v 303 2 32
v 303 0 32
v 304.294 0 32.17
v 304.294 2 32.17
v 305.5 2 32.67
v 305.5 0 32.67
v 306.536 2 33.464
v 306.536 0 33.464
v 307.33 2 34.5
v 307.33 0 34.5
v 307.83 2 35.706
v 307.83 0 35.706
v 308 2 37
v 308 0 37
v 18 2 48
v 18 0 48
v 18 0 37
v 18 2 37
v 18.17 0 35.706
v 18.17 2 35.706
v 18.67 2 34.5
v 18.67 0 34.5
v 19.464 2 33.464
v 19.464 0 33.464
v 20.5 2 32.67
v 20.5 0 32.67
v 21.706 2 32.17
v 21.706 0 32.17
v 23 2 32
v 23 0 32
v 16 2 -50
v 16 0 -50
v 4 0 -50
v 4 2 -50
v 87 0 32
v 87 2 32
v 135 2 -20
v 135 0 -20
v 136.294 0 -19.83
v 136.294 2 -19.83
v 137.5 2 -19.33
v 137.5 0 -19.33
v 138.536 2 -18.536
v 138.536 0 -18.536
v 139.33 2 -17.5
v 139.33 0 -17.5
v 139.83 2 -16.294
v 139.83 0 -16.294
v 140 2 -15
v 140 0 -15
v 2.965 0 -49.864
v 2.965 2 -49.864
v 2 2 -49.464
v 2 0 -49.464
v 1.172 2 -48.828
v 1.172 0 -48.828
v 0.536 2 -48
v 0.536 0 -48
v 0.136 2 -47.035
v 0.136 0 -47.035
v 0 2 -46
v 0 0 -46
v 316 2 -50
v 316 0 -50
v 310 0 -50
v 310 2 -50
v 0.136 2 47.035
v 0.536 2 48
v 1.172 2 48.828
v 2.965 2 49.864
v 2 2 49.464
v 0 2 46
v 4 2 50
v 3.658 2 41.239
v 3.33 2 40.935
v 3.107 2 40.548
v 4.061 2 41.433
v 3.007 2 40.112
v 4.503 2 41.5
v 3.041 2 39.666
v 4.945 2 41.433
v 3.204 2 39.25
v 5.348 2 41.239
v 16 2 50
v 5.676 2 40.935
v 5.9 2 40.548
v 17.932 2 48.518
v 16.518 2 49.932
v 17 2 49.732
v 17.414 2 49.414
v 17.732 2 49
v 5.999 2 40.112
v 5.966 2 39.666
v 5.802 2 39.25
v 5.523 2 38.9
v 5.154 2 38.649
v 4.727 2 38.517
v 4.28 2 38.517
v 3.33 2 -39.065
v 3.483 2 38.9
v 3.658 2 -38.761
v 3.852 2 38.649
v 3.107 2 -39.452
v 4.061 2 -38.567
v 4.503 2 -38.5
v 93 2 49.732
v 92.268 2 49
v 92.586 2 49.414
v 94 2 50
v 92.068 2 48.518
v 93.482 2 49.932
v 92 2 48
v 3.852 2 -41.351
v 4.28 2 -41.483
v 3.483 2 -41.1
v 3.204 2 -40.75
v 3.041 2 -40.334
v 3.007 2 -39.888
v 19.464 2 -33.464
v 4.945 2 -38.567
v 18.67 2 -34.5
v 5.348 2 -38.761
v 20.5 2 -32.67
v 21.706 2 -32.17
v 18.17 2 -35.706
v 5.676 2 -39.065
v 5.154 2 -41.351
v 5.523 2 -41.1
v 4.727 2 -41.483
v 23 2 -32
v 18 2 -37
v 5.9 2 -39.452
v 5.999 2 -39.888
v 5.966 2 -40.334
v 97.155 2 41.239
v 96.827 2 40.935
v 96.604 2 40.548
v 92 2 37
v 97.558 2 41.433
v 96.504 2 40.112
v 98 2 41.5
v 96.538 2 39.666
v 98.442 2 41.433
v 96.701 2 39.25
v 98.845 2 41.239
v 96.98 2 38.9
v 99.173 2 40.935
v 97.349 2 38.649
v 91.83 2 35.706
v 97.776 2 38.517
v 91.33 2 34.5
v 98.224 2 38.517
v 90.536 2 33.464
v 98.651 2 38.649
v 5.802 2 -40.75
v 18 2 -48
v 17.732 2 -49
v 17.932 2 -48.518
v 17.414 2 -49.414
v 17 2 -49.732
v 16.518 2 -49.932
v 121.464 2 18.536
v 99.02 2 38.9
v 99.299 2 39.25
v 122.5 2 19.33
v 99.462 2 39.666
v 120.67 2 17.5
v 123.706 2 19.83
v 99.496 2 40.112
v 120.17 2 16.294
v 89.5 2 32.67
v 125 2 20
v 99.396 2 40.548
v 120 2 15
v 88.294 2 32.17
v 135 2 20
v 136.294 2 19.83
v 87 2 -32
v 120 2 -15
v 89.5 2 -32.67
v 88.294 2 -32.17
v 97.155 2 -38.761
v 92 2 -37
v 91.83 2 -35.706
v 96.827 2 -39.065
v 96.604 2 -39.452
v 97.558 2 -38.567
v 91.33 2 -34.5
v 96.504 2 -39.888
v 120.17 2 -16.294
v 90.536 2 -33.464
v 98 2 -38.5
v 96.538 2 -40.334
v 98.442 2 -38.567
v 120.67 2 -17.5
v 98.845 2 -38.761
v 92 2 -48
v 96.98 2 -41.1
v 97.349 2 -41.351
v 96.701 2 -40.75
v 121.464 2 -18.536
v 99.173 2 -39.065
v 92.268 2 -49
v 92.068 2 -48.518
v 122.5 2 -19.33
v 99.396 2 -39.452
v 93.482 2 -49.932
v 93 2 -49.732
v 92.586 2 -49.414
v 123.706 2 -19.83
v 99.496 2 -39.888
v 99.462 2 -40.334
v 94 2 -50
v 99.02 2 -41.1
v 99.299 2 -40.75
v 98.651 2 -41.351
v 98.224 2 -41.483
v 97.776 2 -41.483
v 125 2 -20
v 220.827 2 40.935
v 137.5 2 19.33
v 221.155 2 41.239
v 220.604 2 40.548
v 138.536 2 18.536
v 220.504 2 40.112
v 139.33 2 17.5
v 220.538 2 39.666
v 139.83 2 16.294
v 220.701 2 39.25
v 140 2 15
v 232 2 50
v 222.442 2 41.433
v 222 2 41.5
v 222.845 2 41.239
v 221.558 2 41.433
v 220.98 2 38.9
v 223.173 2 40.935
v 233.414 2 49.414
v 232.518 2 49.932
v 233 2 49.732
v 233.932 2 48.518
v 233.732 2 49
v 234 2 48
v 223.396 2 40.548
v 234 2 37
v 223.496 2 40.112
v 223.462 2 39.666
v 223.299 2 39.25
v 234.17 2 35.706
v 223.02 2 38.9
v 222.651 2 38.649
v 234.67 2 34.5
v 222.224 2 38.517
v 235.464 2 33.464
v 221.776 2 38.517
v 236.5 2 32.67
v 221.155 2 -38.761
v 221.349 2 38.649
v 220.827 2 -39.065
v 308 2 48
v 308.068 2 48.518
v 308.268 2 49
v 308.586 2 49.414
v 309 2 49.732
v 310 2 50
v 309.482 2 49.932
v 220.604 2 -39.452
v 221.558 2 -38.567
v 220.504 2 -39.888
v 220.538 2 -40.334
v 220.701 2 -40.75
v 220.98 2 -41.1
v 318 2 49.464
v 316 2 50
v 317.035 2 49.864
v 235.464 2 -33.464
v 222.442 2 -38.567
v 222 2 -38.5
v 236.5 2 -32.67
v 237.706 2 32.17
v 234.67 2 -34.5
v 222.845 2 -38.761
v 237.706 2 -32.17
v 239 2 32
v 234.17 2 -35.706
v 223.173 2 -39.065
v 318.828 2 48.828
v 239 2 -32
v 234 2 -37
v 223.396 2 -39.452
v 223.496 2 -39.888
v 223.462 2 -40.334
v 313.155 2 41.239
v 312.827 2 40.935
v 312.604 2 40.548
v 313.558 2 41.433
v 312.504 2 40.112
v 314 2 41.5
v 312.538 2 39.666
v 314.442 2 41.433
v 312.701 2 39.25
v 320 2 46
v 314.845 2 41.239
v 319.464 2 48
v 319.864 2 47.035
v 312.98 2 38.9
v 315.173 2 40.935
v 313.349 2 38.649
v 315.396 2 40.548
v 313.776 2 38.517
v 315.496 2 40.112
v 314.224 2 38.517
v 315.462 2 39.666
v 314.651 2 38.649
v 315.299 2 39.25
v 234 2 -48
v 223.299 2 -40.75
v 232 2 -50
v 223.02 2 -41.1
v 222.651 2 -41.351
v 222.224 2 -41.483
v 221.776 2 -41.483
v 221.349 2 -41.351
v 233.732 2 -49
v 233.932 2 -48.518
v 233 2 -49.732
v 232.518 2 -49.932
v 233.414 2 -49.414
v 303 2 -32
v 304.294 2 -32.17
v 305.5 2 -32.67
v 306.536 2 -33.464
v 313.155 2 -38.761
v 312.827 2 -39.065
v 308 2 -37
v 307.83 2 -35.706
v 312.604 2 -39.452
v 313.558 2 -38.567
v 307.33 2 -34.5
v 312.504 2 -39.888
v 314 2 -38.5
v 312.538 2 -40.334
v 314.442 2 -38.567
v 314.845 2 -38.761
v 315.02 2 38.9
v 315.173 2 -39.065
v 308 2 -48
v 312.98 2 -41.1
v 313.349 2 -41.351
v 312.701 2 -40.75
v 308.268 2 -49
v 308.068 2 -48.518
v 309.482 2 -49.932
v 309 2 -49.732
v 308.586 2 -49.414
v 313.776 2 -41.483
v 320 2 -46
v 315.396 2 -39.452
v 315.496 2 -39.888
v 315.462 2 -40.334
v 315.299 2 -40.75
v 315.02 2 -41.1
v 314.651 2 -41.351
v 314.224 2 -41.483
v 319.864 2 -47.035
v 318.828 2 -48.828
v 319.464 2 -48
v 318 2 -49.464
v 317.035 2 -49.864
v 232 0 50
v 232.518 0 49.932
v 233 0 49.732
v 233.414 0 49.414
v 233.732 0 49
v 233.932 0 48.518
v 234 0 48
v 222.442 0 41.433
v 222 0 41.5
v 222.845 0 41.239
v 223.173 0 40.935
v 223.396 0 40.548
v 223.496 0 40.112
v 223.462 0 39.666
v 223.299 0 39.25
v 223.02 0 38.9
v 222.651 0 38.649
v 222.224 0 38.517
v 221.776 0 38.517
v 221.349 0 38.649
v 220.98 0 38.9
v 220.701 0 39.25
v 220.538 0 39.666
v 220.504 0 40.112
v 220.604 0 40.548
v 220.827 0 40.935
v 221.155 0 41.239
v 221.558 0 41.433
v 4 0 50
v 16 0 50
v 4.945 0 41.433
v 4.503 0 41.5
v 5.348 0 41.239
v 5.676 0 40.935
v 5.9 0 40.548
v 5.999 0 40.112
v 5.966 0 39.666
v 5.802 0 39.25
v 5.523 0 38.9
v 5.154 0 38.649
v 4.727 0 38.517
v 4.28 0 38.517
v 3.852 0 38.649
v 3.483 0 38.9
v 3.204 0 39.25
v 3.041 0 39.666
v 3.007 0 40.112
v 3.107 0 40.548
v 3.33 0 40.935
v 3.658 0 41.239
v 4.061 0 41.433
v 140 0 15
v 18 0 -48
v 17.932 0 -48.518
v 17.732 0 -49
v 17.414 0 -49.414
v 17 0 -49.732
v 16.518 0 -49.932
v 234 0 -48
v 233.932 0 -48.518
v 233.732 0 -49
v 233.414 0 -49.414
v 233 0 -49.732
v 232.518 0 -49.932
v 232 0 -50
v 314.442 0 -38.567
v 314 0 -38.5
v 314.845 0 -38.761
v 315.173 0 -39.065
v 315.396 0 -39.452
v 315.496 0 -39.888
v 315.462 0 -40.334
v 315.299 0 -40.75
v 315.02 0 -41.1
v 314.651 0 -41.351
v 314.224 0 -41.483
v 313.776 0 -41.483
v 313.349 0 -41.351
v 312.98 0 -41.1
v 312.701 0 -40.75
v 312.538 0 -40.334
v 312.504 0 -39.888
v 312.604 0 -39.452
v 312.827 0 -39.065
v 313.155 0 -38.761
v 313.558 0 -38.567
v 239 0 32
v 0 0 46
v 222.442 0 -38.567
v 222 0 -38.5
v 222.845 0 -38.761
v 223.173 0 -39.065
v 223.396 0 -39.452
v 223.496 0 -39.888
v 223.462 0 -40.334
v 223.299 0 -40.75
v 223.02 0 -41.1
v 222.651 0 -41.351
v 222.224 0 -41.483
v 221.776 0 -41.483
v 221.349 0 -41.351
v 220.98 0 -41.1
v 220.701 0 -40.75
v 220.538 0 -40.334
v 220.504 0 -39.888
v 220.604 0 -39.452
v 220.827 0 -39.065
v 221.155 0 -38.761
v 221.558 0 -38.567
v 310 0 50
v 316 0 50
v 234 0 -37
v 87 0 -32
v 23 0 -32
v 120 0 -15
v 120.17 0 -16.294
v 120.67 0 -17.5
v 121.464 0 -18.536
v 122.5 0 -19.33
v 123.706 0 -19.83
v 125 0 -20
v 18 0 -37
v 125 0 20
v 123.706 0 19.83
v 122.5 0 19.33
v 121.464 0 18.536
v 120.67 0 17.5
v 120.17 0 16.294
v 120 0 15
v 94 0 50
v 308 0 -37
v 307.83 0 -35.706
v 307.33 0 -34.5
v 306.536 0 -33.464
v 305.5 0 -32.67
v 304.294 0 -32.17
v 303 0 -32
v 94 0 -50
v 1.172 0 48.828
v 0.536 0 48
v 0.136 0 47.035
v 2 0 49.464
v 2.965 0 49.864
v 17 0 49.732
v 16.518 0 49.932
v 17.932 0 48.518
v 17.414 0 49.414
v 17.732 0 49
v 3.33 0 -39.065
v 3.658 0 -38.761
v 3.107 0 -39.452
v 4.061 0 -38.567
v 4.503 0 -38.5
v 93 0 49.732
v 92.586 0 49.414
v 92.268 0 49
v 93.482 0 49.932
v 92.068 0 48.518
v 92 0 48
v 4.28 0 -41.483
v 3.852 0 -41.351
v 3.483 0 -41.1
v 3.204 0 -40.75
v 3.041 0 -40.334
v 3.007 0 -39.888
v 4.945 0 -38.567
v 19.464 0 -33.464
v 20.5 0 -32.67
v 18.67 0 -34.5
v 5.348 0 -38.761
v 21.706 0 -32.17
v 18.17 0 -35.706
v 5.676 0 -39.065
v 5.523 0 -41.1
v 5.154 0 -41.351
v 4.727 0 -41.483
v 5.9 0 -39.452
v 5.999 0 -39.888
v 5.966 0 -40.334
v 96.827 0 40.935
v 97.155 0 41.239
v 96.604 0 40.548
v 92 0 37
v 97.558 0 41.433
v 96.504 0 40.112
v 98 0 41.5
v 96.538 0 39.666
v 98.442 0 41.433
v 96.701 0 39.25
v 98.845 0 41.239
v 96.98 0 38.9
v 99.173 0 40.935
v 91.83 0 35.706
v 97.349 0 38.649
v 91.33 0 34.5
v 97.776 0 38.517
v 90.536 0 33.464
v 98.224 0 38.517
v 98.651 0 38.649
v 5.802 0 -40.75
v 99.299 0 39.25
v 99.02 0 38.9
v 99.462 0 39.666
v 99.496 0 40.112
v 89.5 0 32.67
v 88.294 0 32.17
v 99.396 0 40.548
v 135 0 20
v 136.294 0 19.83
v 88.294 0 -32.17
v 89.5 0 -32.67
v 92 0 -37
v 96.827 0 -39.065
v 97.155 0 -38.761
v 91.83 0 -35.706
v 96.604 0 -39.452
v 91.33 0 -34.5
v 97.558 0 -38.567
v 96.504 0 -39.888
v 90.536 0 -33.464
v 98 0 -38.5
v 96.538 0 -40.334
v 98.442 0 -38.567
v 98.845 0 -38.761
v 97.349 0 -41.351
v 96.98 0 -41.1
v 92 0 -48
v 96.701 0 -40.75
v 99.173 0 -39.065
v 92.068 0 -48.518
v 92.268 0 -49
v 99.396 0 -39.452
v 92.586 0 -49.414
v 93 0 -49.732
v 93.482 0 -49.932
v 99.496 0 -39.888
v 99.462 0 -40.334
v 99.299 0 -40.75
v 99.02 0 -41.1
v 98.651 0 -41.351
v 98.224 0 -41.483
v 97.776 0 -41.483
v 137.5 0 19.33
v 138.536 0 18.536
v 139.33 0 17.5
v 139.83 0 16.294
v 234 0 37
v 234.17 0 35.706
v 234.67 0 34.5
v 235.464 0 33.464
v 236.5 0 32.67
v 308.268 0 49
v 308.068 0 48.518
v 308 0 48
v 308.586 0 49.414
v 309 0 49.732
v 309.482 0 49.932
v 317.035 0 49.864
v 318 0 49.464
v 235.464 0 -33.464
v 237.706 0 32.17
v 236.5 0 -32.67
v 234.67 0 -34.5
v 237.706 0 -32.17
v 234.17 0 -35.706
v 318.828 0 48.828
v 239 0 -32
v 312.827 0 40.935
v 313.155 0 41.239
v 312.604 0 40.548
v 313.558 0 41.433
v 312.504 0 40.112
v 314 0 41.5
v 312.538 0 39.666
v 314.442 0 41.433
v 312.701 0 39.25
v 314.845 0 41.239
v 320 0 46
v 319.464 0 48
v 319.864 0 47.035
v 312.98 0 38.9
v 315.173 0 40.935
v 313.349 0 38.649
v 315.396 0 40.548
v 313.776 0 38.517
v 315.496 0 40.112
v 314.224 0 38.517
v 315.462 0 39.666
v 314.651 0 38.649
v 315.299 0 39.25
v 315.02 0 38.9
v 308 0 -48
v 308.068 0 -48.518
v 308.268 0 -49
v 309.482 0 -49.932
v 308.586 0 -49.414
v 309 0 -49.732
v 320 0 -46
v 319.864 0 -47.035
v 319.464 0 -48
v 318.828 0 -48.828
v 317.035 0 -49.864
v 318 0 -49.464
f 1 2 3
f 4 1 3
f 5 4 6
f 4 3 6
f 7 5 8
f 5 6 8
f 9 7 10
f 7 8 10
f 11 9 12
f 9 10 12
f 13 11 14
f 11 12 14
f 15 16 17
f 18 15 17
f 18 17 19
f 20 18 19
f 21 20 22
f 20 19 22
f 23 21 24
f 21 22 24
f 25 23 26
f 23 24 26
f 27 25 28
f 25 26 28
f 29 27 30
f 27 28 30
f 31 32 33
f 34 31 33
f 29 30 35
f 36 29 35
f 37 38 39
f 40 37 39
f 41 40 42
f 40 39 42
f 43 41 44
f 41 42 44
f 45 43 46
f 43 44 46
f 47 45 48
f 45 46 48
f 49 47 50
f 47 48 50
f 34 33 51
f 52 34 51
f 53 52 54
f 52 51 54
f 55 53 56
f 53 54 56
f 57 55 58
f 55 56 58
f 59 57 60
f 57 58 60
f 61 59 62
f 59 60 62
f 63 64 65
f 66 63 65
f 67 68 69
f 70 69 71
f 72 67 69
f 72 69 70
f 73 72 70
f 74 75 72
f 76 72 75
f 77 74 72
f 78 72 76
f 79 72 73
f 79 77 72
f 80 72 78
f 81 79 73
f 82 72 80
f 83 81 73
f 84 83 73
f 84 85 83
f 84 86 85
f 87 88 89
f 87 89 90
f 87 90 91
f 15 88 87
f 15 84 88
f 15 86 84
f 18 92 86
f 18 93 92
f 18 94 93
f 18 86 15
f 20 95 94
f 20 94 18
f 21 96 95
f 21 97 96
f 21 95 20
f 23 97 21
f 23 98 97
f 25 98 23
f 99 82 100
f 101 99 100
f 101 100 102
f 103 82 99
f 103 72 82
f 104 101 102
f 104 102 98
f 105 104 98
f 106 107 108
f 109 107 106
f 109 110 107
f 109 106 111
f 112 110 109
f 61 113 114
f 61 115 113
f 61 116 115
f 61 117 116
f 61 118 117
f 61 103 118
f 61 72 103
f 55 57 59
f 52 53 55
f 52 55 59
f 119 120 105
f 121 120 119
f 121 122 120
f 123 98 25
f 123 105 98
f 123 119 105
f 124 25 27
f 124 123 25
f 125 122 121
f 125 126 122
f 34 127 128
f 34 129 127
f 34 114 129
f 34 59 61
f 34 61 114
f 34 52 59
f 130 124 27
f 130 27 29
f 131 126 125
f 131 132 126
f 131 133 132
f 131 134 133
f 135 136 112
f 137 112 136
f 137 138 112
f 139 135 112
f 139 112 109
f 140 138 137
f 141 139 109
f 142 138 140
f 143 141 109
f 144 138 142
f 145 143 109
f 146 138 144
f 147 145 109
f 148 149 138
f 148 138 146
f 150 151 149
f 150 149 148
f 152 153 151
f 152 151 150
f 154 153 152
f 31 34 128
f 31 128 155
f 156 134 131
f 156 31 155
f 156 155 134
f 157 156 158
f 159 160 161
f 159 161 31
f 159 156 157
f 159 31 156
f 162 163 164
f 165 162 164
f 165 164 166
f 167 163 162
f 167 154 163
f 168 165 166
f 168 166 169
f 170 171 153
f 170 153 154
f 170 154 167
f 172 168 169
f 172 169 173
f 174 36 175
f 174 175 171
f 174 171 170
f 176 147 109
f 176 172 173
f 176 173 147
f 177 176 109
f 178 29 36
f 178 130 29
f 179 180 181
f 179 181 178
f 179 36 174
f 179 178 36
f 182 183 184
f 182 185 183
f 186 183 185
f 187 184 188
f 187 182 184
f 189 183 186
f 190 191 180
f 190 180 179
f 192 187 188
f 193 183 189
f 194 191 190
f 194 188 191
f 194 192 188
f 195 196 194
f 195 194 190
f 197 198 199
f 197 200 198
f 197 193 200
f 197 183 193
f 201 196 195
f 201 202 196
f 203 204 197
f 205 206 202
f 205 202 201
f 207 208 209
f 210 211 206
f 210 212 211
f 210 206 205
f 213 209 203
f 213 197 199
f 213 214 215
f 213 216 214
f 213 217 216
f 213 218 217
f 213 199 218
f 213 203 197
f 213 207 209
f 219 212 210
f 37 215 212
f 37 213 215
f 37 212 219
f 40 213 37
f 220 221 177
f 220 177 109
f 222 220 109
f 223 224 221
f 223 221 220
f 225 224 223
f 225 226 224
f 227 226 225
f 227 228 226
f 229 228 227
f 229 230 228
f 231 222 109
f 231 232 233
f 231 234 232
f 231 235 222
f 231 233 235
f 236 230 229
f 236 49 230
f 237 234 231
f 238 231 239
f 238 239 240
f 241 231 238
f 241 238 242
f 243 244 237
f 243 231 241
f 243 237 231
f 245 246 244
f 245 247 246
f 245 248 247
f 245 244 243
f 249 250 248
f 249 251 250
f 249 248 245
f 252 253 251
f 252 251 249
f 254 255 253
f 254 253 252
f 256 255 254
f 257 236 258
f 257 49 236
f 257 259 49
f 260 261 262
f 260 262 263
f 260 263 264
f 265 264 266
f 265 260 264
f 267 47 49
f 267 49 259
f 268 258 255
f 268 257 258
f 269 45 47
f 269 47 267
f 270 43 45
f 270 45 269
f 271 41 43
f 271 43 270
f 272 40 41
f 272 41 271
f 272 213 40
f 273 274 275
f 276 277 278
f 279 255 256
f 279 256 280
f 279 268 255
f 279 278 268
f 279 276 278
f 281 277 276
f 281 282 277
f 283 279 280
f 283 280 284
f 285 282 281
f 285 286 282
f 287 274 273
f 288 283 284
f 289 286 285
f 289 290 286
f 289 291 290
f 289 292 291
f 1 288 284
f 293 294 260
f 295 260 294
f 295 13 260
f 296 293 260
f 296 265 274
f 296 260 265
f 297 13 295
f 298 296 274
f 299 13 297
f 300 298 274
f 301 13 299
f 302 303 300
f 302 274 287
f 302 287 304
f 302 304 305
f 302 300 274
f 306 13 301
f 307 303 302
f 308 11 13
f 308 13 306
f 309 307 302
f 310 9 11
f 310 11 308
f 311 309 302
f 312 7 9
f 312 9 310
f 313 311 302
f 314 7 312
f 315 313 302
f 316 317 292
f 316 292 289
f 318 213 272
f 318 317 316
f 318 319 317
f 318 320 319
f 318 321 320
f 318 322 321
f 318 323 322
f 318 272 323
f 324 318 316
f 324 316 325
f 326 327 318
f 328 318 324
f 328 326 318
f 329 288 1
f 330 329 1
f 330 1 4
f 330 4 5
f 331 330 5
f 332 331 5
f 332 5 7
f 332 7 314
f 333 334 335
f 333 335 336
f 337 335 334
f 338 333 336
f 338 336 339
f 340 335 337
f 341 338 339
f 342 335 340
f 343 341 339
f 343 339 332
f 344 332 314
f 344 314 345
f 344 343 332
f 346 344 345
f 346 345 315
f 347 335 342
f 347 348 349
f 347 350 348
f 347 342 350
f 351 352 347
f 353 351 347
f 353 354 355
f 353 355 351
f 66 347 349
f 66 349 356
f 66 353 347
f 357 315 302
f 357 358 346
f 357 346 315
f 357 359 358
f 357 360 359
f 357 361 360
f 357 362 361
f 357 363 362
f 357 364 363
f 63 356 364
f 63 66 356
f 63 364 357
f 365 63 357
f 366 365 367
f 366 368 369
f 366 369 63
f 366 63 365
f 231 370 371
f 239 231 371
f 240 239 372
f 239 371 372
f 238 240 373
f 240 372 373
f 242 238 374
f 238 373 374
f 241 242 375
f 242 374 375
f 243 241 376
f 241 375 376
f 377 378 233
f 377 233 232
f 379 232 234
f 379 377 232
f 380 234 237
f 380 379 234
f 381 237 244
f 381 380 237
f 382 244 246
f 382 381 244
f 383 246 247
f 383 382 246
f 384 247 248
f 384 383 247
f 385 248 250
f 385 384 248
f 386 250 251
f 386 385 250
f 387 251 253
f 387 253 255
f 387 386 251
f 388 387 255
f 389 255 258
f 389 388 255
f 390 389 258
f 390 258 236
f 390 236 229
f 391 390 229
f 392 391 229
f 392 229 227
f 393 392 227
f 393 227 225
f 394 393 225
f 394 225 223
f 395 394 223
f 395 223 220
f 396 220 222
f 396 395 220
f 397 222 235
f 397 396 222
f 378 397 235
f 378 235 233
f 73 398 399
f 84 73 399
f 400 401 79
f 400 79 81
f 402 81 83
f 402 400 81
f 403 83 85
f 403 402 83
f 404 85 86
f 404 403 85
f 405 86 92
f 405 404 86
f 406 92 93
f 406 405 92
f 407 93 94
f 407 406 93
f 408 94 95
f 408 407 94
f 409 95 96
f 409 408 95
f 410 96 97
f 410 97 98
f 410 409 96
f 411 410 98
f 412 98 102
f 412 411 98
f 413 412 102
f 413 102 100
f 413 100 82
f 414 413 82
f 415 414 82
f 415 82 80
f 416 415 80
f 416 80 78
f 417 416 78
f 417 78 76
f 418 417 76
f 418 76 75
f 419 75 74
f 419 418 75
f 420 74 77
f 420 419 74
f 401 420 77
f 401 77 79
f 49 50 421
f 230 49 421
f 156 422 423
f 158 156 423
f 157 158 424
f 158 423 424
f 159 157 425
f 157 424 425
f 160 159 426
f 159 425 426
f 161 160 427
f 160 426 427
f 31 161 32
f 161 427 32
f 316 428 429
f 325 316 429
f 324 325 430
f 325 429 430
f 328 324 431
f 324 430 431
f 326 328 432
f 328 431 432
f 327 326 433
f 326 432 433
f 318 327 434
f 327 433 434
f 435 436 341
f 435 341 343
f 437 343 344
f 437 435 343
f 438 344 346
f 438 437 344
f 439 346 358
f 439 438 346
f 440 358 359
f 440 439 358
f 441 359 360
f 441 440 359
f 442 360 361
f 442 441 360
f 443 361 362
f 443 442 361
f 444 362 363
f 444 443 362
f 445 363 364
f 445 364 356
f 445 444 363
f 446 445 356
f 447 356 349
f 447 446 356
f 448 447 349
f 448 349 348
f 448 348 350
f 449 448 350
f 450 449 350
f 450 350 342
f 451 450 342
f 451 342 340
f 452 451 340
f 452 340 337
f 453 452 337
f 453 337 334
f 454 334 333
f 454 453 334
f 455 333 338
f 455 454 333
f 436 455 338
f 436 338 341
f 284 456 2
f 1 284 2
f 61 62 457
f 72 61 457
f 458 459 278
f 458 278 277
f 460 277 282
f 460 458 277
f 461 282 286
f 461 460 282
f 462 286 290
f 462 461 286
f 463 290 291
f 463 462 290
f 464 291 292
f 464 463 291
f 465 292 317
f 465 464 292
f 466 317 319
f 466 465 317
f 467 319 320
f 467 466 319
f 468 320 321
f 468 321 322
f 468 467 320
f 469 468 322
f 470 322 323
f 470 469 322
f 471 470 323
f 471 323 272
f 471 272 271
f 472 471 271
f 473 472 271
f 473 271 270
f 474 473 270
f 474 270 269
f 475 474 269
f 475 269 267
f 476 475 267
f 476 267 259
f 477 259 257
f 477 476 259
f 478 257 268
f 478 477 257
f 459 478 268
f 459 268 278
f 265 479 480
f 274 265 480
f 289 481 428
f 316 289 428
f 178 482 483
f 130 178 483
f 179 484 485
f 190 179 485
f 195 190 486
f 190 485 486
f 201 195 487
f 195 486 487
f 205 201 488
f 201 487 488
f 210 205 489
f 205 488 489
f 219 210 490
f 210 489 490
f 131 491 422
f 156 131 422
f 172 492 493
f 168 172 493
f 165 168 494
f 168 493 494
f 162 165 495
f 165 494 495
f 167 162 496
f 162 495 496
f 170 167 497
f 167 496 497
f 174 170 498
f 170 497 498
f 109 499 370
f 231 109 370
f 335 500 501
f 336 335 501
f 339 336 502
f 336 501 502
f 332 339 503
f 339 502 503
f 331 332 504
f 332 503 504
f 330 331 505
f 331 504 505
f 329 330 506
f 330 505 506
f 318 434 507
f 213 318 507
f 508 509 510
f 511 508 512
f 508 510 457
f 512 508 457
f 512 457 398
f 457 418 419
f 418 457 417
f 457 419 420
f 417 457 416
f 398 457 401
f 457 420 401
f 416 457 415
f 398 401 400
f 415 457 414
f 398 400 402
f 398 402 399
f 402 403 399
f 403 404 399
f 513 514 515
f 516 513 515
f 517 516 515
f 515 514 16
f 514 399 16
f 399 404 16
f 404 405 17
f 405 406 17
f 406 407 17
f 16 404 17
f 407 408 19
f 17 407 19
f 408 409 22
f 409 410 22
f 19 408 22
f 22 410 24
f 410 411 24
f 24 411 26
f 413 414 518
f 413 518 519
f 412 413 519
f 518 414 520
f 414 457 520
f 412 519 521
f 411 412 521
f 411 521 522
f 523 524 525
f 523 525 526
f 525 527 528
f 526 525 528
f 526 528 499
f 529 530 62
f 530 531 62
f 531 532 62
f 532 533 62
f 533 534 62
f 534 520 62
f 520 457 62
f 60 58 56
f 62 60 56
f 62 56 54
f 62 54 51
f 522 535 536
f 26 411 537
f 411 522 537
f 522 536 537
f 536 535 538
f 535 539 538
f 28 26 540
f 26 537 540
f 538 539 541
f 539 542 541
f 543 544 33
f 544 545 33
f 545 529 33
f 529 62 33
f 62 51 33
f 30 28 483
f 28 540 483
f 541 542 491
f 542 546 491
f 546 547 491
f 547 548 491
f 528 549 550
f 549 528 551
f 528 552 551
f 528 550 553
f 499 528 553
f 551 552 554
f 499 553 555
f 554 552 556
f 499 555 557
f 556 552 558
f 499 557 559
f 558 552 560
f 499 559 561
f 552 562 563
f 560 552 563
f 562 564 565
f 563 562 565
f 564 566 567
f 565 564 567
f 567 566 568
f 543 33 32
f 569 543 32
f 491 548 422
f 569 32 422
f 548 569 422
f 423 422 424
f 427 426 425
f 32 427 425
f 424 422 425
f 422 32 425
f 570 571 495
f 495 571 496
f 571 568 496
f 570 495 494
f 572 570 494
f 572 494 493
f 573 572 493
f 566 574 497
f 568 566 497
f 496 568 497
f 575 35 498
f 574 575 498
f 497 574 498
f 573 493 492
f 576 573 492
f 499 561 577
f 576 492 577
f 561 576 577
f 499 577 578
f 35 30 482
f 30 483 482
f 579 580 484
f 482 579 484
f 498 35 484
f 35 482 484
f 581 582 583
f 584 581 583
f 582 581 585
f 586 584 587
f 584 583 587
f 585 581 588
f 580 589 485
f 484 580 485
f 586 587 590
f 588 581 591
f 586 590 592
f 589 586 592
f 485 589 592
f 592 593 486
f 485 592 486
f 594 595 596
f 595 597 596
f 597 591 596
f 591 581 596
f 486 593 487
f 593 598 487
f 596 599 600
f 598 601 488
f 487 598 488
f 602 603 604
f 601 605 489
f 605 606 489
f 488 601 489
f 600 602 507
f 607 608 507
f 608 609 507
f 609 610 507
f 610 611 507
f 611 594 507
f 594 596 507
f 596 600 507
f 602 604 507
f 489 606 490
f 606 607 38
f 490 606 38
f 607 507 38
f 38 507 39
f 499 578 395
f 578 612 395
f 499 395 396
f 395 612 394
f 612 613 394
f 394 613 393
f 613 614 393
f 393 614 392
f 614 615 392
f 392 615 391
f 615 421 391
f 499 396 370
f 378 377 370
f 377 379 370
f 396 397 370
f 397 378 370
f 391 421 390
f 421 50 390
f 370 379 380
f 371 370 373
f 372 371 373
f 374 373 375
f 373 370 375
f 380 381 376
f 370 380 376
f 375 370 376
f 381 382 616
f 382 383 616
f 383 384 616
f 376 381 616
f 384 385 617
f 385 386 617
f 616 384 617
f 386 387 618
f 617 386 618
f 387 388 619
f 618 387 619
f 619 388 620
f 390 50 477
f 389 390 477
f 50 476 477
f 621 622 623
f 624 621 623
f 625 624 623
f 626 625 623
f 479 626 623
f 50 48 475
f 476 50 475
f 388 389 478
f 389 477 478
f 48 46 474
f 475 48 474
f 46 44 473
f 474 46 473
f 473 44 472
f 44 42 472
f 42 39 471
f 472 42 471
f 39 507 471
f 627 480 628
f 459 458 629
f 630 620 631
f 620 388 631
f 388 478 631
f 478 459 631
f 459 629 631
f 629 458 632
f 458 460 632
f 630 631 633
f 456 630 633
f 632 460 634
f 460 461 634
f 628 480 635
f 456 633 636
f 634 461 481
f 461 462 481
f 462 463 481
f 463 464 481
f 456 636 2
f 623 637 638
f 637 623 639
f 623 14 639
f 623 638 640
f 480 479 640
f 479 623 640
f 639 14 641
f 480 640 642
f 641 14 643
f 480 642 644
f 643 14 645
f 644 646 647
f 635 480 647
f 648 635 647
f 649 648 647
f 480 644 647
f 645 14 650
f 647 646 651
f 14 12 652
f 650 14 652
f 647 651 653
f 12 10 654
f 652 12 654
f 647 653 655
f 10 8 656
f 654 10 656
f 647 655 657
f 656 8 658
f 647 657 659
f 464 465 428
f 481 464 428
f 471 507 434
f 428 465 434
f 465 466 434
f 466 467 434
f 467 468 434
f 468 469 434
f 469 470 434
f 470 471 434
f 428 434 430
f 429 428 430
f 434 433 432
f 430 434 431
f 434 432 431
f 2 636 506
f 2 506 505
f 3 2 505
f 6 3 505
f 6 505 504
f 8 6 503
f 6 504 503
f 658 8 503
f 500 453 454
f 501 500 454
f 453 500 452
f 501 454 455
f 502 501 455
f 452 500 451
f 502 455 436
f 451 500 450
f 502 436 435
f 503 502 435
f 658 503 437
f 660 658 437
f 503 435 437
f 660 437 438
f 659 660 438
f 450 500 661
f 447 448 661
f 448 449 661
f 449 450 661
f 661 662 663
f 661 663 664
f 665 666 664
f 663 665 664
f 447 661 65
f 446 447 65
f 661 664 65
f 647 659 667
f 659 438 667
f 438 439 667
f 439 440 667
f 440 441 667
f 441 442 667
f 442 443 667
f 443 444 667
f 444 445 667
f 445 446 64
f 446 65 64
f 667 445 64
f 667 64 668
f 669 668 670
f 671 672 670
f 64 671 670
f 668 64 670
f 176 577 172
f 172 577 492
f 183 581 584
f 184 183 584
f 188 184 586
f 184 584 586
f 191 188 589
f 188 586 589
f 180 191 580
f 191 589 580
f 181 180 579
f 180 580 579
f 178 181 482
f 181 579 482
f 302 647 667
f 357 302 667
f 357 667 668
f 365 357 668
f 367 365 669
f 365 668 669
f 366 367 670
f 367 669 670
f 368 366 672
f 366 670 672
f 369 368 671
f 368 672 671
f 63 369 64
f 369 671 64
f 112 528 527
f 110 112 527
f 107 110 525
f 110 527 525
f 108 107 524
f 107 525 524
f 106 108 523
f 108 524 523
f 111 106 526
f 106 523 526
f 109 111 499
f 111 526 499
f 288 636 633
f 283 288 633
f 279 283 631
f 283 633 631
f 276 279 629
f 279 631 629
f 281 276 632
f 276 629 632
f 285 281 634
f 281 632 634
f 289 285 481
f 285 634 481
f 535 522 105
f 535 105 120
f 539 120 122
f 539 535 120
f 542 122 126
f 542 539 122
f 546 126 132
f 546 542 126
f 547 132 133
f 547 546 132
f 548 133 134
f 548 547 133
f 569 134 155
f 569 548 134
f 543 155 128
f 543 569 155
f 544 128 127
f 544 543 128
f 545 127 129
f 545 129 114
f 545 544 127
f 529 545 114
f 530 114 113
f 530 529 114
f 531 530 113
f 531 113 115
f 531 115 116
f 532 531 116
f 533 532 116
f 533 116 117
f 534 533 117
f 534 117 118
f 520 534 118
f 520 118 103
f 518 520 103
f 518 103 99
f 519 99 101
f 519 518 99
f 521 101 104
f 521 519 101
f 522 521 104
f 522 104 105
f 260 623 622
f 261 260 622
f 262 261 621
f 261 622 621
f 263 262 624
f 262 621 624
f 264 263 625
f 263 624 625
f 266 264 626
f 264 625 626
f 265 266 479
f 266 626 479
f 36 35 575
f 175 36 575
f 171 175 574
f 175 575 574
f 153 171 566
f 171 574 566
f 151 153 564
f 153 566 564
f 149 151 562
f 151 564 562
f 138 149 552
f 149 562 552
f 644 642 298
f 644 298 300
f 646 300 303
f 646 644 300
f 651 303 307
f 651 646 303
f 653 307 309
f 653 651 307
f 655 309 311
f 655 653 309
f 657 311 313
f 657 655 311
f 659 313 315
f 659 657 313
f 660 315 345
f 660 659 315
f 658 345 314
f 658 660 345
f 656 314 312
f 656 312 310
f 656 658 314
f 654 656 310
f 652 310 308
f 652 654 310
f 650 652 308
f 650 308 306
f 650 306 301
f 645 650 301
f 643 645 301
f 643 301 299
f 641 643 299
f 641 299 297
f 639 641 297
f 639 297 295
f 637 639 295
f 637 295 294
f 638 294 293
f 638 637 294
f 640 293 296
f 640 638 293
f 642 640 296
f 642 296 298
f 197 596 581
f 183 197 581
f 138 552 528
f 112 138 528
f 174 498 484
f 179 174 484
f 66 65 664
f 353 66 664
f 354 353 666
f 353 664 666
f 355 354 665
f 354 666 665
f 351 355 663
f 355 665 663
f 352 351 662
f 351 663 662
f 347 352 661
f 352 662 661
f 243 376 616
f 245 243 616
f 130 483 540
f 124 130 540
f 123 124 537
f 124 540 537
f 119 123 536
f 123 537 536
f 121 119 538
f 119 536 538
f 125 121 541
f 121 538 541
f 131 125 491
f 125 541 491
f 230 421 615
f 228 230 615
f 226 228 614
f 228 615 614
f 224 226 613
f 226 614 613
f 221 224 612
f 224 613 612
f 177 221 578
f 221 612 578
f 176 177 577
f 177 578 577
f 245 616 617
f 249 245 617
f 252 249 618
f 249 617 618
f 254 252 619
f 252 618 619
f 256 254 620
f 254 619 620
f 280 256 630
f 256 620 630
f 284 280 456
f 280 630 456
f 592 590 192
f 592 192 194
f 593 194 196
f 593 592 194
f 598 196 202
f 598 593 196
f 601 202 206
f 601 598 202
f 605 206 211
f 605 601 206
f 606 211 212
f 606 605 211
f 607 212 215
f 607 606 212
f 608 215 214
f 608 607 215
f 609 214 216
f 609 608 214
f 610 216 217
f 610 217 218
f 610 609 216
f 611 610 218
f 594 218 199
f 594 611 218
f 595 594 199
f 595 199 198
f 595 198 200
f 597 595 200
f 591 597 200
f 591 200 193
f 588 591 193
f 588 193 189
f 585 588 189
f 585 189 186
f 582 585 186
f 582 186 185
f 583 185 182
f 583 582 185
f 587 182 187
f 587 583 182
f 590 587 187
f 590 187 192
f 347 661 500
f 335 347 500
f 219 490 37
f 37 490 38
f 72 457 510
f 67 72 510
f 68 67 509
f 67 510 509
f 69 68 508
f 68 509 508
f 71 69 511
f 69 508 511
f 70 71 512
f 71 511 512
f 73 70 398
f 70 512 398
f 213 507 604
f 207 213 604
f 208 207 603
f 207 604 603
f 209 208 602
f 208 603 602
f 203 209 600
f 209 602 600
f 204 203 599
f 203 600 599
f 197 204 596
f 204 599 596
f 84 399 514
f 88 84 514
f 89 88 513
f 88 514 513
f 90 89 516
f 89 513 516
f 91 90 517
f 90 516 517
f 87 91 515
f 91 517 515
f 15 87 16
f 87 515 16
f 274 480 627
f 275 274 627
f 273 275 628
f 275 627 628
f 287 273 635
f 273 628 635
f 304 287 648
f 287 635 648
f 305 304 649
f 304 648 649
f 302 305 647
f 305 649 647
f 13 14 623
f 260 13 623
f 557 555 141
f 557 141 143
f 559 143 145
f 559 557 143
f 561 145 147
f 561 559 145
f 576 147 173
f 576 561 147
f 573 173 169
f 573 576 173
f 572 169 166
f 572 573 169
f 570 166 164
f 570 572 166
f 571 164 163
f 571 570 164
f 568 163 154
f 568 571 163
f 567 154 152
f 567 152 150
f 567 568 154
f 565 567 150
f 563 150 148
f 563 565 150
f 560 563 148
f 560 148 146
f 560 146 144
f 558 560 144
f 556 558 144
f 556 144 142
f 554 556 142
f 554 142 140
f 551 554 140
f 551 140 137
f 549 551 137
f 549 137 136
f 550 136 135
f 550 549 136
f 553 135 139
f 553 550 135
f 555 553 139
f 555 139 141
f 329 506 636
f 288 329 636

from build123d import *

# Parameters (mm, degrees)
SKETCH_1_R      = 1.5
EXTRUDE_1_DEPTH = 2


with BuildPart() as part:
    # 草图1 → 凸台-拉伸1 (new body)
    # profile 1 of 2: a face of its own
    with BuildSketch(Plane(origin=(0, 0, 0), x_dir=(1, 0, 0), z_dir=(0, 1, 0))):
        with BuildLine():
            Line((6, 50), (4, 50))
            ThreePointArc((4, 50), (1.171572875, 48.828427125), (0, 46))
            Line((0, 46), (0, 0))
            Line((0, 0), (120, 0))
            Line((120, 0), (120, 15))
            ThreePointArc((120, 15), (121.464466094, 18.535533906), (125, 20))
            Line((125, 20), (135, 20))
            ThreePointArc((135, 20), (138.535533906, 18.535533906), (140, 15))
            Line((140, 15), (140, 0))
            Line((140, 0), (320, 0))
            Line((320, 0), (320, 46))
            ThreePointArc((320, 46), (318.828427125, 48.828427125), (316, 50))
            Line((316, 50), (310, 50))
            ThreePointArc((310, 50), (308.585786438, 49.414213562), (308, 48))
            Line((308, 48), (308, 37))
            ThreePointArc((308, 37), (306.535533906, 33.464466094), (303, 32))
            Line((303, 32), (239, 32))
            ThreePointArc((239, 32), (235.464466094, 33.464466094), (234, 37))
            Line((234, 37), (234, 48))
            ThreePointArc((234, 48), (233.414213562, 49.414213562), (232, 50))
            Line((232, 50), (94, 50))
            ThreePointArc((94, 50), (92.585786438, 49.414213562), (92, 48))
            Line((92, 48), (92, 37))
            ThreePointArc((92, 37), (90.535533906, 33.464466094), (87, 32))
            Line((87, 32), (23, 32))
            ThreePointArc((23, 32), (19.464466094, 33.464466094), (18, 37))
            Line((18, 37), (18, 48))
            ThreePointArc((18, 48), (17.414213562, 49.414213562), (16, 50))
            Line((16, 50), (6, 50))
        make_face()
        with Locations(Location((4.503217652, 40, 0), (0, 0, 270))):
            Circle(SKETCH_1_R, mode=Mode.SUBTRACT)
        with Locations(Location((98, 40, 0), (0, 0, 270))):
            Circle(SKETCH_1_R, mode=Mode.SUBTRACT)
        with Locations(Location((222, 40, 0), (0, 0, 270))):
            Circle(SKETCH_1_R, mode=Mode.SUBTRACT)
        with Locations(Location((314, 40, 0), (0, 0, 270))):
            Circle(SKETCH_1_R, mode=Mode.SUBTRACT)
    # profile 2 of 2: a face of its own
    with BuildSketch(Plane(origin=(0, 0, 0), x_dir=(1, 0, 0), z_dir=(0, 1, 0))):
        with BuildLine():
            Line((120, 0), (0, 0))
            Line((0, 0), (0, -46))
            ThreePointArc((0, -46), (1.171572875, -48.828427125), (4, -50))
            Line((4, -50), (6, -50))
            Line((6, -50), (16, -50))
            ThreePointArc((16, -50), (17.414213562, -49.414213562), (18, -48))
            Line((18, -48), (18, -37))
            ThreePointArc((18, -37), (19.464466094, -33.464466094), (23, -32))
            Line((23, -32), (87, -32))
            ThreePointArc((87, -32), (90.535533906, -33.464466094), (92, -37))
            Line((92, -37), (92, -48))
            ThreePointArc((92, -48), (92.585786438, -49.414213562), (94, -50))
            Line((94, -50), (232, -50))
            ThreePointArc((232, -50), (233.414213562, -49.414213562), (234, -48))
            Line((234, -48), (234, -37))
            ThreePointArc((234, -37), (235.464466094, -33.464466094), (239, -32))
            Line((239, -32), (303, -32))
            ThreePointArc((303, -32), (306.535533906, -33.464466094), (308, -37))
            Line((308, -37), (308, -48))
            ThreePointArc((308, -48), (308.585786438, -49.414213562), (310, -50))
            Line((310, -50), (316, -50))
            ThreePointArc((316, -50), (318.828427125, -48.828427125), (320, -46))
            Line((320, -46), (320, 0))
            Line((320, 0), (140, 0))
            Line((140, 0), (140, -15))
            ThreePointArc((140, -15), (138.535533906, -18.535533906), (135, -20))
            Line((135, -20), (125, -20))
            ThreePointArc((125, -20), (121.464466094, -18.535533906), (120, -15))
            Line((120, -15), (120, 0))
        make_face()
        with Locations(Location((4.503217652, -40, 0), (0, 0, 270))):
            Circle(SKETCH_1_R, mode=Mode.SUBTRACT)
        with Locations(Location((98, -40, 0), (0, 0, 270))):
            Circle(SKETCH_1_R, mode=Mode.SUBTRACT)
        with Locations(Location((222, -40, 0), (0, 0, 270))):
            Circle(SKETCH_1_R, mode=Mode.SUBTRACT)
        with Locations(Location((314, -40, 0), (0, 0, 270))):
            Circle(SKETCH_1_R, mode=Mode.SUBTRACT)
    extrude(amount=EXTRUDE_1_DEPTH)


solid = part.part
